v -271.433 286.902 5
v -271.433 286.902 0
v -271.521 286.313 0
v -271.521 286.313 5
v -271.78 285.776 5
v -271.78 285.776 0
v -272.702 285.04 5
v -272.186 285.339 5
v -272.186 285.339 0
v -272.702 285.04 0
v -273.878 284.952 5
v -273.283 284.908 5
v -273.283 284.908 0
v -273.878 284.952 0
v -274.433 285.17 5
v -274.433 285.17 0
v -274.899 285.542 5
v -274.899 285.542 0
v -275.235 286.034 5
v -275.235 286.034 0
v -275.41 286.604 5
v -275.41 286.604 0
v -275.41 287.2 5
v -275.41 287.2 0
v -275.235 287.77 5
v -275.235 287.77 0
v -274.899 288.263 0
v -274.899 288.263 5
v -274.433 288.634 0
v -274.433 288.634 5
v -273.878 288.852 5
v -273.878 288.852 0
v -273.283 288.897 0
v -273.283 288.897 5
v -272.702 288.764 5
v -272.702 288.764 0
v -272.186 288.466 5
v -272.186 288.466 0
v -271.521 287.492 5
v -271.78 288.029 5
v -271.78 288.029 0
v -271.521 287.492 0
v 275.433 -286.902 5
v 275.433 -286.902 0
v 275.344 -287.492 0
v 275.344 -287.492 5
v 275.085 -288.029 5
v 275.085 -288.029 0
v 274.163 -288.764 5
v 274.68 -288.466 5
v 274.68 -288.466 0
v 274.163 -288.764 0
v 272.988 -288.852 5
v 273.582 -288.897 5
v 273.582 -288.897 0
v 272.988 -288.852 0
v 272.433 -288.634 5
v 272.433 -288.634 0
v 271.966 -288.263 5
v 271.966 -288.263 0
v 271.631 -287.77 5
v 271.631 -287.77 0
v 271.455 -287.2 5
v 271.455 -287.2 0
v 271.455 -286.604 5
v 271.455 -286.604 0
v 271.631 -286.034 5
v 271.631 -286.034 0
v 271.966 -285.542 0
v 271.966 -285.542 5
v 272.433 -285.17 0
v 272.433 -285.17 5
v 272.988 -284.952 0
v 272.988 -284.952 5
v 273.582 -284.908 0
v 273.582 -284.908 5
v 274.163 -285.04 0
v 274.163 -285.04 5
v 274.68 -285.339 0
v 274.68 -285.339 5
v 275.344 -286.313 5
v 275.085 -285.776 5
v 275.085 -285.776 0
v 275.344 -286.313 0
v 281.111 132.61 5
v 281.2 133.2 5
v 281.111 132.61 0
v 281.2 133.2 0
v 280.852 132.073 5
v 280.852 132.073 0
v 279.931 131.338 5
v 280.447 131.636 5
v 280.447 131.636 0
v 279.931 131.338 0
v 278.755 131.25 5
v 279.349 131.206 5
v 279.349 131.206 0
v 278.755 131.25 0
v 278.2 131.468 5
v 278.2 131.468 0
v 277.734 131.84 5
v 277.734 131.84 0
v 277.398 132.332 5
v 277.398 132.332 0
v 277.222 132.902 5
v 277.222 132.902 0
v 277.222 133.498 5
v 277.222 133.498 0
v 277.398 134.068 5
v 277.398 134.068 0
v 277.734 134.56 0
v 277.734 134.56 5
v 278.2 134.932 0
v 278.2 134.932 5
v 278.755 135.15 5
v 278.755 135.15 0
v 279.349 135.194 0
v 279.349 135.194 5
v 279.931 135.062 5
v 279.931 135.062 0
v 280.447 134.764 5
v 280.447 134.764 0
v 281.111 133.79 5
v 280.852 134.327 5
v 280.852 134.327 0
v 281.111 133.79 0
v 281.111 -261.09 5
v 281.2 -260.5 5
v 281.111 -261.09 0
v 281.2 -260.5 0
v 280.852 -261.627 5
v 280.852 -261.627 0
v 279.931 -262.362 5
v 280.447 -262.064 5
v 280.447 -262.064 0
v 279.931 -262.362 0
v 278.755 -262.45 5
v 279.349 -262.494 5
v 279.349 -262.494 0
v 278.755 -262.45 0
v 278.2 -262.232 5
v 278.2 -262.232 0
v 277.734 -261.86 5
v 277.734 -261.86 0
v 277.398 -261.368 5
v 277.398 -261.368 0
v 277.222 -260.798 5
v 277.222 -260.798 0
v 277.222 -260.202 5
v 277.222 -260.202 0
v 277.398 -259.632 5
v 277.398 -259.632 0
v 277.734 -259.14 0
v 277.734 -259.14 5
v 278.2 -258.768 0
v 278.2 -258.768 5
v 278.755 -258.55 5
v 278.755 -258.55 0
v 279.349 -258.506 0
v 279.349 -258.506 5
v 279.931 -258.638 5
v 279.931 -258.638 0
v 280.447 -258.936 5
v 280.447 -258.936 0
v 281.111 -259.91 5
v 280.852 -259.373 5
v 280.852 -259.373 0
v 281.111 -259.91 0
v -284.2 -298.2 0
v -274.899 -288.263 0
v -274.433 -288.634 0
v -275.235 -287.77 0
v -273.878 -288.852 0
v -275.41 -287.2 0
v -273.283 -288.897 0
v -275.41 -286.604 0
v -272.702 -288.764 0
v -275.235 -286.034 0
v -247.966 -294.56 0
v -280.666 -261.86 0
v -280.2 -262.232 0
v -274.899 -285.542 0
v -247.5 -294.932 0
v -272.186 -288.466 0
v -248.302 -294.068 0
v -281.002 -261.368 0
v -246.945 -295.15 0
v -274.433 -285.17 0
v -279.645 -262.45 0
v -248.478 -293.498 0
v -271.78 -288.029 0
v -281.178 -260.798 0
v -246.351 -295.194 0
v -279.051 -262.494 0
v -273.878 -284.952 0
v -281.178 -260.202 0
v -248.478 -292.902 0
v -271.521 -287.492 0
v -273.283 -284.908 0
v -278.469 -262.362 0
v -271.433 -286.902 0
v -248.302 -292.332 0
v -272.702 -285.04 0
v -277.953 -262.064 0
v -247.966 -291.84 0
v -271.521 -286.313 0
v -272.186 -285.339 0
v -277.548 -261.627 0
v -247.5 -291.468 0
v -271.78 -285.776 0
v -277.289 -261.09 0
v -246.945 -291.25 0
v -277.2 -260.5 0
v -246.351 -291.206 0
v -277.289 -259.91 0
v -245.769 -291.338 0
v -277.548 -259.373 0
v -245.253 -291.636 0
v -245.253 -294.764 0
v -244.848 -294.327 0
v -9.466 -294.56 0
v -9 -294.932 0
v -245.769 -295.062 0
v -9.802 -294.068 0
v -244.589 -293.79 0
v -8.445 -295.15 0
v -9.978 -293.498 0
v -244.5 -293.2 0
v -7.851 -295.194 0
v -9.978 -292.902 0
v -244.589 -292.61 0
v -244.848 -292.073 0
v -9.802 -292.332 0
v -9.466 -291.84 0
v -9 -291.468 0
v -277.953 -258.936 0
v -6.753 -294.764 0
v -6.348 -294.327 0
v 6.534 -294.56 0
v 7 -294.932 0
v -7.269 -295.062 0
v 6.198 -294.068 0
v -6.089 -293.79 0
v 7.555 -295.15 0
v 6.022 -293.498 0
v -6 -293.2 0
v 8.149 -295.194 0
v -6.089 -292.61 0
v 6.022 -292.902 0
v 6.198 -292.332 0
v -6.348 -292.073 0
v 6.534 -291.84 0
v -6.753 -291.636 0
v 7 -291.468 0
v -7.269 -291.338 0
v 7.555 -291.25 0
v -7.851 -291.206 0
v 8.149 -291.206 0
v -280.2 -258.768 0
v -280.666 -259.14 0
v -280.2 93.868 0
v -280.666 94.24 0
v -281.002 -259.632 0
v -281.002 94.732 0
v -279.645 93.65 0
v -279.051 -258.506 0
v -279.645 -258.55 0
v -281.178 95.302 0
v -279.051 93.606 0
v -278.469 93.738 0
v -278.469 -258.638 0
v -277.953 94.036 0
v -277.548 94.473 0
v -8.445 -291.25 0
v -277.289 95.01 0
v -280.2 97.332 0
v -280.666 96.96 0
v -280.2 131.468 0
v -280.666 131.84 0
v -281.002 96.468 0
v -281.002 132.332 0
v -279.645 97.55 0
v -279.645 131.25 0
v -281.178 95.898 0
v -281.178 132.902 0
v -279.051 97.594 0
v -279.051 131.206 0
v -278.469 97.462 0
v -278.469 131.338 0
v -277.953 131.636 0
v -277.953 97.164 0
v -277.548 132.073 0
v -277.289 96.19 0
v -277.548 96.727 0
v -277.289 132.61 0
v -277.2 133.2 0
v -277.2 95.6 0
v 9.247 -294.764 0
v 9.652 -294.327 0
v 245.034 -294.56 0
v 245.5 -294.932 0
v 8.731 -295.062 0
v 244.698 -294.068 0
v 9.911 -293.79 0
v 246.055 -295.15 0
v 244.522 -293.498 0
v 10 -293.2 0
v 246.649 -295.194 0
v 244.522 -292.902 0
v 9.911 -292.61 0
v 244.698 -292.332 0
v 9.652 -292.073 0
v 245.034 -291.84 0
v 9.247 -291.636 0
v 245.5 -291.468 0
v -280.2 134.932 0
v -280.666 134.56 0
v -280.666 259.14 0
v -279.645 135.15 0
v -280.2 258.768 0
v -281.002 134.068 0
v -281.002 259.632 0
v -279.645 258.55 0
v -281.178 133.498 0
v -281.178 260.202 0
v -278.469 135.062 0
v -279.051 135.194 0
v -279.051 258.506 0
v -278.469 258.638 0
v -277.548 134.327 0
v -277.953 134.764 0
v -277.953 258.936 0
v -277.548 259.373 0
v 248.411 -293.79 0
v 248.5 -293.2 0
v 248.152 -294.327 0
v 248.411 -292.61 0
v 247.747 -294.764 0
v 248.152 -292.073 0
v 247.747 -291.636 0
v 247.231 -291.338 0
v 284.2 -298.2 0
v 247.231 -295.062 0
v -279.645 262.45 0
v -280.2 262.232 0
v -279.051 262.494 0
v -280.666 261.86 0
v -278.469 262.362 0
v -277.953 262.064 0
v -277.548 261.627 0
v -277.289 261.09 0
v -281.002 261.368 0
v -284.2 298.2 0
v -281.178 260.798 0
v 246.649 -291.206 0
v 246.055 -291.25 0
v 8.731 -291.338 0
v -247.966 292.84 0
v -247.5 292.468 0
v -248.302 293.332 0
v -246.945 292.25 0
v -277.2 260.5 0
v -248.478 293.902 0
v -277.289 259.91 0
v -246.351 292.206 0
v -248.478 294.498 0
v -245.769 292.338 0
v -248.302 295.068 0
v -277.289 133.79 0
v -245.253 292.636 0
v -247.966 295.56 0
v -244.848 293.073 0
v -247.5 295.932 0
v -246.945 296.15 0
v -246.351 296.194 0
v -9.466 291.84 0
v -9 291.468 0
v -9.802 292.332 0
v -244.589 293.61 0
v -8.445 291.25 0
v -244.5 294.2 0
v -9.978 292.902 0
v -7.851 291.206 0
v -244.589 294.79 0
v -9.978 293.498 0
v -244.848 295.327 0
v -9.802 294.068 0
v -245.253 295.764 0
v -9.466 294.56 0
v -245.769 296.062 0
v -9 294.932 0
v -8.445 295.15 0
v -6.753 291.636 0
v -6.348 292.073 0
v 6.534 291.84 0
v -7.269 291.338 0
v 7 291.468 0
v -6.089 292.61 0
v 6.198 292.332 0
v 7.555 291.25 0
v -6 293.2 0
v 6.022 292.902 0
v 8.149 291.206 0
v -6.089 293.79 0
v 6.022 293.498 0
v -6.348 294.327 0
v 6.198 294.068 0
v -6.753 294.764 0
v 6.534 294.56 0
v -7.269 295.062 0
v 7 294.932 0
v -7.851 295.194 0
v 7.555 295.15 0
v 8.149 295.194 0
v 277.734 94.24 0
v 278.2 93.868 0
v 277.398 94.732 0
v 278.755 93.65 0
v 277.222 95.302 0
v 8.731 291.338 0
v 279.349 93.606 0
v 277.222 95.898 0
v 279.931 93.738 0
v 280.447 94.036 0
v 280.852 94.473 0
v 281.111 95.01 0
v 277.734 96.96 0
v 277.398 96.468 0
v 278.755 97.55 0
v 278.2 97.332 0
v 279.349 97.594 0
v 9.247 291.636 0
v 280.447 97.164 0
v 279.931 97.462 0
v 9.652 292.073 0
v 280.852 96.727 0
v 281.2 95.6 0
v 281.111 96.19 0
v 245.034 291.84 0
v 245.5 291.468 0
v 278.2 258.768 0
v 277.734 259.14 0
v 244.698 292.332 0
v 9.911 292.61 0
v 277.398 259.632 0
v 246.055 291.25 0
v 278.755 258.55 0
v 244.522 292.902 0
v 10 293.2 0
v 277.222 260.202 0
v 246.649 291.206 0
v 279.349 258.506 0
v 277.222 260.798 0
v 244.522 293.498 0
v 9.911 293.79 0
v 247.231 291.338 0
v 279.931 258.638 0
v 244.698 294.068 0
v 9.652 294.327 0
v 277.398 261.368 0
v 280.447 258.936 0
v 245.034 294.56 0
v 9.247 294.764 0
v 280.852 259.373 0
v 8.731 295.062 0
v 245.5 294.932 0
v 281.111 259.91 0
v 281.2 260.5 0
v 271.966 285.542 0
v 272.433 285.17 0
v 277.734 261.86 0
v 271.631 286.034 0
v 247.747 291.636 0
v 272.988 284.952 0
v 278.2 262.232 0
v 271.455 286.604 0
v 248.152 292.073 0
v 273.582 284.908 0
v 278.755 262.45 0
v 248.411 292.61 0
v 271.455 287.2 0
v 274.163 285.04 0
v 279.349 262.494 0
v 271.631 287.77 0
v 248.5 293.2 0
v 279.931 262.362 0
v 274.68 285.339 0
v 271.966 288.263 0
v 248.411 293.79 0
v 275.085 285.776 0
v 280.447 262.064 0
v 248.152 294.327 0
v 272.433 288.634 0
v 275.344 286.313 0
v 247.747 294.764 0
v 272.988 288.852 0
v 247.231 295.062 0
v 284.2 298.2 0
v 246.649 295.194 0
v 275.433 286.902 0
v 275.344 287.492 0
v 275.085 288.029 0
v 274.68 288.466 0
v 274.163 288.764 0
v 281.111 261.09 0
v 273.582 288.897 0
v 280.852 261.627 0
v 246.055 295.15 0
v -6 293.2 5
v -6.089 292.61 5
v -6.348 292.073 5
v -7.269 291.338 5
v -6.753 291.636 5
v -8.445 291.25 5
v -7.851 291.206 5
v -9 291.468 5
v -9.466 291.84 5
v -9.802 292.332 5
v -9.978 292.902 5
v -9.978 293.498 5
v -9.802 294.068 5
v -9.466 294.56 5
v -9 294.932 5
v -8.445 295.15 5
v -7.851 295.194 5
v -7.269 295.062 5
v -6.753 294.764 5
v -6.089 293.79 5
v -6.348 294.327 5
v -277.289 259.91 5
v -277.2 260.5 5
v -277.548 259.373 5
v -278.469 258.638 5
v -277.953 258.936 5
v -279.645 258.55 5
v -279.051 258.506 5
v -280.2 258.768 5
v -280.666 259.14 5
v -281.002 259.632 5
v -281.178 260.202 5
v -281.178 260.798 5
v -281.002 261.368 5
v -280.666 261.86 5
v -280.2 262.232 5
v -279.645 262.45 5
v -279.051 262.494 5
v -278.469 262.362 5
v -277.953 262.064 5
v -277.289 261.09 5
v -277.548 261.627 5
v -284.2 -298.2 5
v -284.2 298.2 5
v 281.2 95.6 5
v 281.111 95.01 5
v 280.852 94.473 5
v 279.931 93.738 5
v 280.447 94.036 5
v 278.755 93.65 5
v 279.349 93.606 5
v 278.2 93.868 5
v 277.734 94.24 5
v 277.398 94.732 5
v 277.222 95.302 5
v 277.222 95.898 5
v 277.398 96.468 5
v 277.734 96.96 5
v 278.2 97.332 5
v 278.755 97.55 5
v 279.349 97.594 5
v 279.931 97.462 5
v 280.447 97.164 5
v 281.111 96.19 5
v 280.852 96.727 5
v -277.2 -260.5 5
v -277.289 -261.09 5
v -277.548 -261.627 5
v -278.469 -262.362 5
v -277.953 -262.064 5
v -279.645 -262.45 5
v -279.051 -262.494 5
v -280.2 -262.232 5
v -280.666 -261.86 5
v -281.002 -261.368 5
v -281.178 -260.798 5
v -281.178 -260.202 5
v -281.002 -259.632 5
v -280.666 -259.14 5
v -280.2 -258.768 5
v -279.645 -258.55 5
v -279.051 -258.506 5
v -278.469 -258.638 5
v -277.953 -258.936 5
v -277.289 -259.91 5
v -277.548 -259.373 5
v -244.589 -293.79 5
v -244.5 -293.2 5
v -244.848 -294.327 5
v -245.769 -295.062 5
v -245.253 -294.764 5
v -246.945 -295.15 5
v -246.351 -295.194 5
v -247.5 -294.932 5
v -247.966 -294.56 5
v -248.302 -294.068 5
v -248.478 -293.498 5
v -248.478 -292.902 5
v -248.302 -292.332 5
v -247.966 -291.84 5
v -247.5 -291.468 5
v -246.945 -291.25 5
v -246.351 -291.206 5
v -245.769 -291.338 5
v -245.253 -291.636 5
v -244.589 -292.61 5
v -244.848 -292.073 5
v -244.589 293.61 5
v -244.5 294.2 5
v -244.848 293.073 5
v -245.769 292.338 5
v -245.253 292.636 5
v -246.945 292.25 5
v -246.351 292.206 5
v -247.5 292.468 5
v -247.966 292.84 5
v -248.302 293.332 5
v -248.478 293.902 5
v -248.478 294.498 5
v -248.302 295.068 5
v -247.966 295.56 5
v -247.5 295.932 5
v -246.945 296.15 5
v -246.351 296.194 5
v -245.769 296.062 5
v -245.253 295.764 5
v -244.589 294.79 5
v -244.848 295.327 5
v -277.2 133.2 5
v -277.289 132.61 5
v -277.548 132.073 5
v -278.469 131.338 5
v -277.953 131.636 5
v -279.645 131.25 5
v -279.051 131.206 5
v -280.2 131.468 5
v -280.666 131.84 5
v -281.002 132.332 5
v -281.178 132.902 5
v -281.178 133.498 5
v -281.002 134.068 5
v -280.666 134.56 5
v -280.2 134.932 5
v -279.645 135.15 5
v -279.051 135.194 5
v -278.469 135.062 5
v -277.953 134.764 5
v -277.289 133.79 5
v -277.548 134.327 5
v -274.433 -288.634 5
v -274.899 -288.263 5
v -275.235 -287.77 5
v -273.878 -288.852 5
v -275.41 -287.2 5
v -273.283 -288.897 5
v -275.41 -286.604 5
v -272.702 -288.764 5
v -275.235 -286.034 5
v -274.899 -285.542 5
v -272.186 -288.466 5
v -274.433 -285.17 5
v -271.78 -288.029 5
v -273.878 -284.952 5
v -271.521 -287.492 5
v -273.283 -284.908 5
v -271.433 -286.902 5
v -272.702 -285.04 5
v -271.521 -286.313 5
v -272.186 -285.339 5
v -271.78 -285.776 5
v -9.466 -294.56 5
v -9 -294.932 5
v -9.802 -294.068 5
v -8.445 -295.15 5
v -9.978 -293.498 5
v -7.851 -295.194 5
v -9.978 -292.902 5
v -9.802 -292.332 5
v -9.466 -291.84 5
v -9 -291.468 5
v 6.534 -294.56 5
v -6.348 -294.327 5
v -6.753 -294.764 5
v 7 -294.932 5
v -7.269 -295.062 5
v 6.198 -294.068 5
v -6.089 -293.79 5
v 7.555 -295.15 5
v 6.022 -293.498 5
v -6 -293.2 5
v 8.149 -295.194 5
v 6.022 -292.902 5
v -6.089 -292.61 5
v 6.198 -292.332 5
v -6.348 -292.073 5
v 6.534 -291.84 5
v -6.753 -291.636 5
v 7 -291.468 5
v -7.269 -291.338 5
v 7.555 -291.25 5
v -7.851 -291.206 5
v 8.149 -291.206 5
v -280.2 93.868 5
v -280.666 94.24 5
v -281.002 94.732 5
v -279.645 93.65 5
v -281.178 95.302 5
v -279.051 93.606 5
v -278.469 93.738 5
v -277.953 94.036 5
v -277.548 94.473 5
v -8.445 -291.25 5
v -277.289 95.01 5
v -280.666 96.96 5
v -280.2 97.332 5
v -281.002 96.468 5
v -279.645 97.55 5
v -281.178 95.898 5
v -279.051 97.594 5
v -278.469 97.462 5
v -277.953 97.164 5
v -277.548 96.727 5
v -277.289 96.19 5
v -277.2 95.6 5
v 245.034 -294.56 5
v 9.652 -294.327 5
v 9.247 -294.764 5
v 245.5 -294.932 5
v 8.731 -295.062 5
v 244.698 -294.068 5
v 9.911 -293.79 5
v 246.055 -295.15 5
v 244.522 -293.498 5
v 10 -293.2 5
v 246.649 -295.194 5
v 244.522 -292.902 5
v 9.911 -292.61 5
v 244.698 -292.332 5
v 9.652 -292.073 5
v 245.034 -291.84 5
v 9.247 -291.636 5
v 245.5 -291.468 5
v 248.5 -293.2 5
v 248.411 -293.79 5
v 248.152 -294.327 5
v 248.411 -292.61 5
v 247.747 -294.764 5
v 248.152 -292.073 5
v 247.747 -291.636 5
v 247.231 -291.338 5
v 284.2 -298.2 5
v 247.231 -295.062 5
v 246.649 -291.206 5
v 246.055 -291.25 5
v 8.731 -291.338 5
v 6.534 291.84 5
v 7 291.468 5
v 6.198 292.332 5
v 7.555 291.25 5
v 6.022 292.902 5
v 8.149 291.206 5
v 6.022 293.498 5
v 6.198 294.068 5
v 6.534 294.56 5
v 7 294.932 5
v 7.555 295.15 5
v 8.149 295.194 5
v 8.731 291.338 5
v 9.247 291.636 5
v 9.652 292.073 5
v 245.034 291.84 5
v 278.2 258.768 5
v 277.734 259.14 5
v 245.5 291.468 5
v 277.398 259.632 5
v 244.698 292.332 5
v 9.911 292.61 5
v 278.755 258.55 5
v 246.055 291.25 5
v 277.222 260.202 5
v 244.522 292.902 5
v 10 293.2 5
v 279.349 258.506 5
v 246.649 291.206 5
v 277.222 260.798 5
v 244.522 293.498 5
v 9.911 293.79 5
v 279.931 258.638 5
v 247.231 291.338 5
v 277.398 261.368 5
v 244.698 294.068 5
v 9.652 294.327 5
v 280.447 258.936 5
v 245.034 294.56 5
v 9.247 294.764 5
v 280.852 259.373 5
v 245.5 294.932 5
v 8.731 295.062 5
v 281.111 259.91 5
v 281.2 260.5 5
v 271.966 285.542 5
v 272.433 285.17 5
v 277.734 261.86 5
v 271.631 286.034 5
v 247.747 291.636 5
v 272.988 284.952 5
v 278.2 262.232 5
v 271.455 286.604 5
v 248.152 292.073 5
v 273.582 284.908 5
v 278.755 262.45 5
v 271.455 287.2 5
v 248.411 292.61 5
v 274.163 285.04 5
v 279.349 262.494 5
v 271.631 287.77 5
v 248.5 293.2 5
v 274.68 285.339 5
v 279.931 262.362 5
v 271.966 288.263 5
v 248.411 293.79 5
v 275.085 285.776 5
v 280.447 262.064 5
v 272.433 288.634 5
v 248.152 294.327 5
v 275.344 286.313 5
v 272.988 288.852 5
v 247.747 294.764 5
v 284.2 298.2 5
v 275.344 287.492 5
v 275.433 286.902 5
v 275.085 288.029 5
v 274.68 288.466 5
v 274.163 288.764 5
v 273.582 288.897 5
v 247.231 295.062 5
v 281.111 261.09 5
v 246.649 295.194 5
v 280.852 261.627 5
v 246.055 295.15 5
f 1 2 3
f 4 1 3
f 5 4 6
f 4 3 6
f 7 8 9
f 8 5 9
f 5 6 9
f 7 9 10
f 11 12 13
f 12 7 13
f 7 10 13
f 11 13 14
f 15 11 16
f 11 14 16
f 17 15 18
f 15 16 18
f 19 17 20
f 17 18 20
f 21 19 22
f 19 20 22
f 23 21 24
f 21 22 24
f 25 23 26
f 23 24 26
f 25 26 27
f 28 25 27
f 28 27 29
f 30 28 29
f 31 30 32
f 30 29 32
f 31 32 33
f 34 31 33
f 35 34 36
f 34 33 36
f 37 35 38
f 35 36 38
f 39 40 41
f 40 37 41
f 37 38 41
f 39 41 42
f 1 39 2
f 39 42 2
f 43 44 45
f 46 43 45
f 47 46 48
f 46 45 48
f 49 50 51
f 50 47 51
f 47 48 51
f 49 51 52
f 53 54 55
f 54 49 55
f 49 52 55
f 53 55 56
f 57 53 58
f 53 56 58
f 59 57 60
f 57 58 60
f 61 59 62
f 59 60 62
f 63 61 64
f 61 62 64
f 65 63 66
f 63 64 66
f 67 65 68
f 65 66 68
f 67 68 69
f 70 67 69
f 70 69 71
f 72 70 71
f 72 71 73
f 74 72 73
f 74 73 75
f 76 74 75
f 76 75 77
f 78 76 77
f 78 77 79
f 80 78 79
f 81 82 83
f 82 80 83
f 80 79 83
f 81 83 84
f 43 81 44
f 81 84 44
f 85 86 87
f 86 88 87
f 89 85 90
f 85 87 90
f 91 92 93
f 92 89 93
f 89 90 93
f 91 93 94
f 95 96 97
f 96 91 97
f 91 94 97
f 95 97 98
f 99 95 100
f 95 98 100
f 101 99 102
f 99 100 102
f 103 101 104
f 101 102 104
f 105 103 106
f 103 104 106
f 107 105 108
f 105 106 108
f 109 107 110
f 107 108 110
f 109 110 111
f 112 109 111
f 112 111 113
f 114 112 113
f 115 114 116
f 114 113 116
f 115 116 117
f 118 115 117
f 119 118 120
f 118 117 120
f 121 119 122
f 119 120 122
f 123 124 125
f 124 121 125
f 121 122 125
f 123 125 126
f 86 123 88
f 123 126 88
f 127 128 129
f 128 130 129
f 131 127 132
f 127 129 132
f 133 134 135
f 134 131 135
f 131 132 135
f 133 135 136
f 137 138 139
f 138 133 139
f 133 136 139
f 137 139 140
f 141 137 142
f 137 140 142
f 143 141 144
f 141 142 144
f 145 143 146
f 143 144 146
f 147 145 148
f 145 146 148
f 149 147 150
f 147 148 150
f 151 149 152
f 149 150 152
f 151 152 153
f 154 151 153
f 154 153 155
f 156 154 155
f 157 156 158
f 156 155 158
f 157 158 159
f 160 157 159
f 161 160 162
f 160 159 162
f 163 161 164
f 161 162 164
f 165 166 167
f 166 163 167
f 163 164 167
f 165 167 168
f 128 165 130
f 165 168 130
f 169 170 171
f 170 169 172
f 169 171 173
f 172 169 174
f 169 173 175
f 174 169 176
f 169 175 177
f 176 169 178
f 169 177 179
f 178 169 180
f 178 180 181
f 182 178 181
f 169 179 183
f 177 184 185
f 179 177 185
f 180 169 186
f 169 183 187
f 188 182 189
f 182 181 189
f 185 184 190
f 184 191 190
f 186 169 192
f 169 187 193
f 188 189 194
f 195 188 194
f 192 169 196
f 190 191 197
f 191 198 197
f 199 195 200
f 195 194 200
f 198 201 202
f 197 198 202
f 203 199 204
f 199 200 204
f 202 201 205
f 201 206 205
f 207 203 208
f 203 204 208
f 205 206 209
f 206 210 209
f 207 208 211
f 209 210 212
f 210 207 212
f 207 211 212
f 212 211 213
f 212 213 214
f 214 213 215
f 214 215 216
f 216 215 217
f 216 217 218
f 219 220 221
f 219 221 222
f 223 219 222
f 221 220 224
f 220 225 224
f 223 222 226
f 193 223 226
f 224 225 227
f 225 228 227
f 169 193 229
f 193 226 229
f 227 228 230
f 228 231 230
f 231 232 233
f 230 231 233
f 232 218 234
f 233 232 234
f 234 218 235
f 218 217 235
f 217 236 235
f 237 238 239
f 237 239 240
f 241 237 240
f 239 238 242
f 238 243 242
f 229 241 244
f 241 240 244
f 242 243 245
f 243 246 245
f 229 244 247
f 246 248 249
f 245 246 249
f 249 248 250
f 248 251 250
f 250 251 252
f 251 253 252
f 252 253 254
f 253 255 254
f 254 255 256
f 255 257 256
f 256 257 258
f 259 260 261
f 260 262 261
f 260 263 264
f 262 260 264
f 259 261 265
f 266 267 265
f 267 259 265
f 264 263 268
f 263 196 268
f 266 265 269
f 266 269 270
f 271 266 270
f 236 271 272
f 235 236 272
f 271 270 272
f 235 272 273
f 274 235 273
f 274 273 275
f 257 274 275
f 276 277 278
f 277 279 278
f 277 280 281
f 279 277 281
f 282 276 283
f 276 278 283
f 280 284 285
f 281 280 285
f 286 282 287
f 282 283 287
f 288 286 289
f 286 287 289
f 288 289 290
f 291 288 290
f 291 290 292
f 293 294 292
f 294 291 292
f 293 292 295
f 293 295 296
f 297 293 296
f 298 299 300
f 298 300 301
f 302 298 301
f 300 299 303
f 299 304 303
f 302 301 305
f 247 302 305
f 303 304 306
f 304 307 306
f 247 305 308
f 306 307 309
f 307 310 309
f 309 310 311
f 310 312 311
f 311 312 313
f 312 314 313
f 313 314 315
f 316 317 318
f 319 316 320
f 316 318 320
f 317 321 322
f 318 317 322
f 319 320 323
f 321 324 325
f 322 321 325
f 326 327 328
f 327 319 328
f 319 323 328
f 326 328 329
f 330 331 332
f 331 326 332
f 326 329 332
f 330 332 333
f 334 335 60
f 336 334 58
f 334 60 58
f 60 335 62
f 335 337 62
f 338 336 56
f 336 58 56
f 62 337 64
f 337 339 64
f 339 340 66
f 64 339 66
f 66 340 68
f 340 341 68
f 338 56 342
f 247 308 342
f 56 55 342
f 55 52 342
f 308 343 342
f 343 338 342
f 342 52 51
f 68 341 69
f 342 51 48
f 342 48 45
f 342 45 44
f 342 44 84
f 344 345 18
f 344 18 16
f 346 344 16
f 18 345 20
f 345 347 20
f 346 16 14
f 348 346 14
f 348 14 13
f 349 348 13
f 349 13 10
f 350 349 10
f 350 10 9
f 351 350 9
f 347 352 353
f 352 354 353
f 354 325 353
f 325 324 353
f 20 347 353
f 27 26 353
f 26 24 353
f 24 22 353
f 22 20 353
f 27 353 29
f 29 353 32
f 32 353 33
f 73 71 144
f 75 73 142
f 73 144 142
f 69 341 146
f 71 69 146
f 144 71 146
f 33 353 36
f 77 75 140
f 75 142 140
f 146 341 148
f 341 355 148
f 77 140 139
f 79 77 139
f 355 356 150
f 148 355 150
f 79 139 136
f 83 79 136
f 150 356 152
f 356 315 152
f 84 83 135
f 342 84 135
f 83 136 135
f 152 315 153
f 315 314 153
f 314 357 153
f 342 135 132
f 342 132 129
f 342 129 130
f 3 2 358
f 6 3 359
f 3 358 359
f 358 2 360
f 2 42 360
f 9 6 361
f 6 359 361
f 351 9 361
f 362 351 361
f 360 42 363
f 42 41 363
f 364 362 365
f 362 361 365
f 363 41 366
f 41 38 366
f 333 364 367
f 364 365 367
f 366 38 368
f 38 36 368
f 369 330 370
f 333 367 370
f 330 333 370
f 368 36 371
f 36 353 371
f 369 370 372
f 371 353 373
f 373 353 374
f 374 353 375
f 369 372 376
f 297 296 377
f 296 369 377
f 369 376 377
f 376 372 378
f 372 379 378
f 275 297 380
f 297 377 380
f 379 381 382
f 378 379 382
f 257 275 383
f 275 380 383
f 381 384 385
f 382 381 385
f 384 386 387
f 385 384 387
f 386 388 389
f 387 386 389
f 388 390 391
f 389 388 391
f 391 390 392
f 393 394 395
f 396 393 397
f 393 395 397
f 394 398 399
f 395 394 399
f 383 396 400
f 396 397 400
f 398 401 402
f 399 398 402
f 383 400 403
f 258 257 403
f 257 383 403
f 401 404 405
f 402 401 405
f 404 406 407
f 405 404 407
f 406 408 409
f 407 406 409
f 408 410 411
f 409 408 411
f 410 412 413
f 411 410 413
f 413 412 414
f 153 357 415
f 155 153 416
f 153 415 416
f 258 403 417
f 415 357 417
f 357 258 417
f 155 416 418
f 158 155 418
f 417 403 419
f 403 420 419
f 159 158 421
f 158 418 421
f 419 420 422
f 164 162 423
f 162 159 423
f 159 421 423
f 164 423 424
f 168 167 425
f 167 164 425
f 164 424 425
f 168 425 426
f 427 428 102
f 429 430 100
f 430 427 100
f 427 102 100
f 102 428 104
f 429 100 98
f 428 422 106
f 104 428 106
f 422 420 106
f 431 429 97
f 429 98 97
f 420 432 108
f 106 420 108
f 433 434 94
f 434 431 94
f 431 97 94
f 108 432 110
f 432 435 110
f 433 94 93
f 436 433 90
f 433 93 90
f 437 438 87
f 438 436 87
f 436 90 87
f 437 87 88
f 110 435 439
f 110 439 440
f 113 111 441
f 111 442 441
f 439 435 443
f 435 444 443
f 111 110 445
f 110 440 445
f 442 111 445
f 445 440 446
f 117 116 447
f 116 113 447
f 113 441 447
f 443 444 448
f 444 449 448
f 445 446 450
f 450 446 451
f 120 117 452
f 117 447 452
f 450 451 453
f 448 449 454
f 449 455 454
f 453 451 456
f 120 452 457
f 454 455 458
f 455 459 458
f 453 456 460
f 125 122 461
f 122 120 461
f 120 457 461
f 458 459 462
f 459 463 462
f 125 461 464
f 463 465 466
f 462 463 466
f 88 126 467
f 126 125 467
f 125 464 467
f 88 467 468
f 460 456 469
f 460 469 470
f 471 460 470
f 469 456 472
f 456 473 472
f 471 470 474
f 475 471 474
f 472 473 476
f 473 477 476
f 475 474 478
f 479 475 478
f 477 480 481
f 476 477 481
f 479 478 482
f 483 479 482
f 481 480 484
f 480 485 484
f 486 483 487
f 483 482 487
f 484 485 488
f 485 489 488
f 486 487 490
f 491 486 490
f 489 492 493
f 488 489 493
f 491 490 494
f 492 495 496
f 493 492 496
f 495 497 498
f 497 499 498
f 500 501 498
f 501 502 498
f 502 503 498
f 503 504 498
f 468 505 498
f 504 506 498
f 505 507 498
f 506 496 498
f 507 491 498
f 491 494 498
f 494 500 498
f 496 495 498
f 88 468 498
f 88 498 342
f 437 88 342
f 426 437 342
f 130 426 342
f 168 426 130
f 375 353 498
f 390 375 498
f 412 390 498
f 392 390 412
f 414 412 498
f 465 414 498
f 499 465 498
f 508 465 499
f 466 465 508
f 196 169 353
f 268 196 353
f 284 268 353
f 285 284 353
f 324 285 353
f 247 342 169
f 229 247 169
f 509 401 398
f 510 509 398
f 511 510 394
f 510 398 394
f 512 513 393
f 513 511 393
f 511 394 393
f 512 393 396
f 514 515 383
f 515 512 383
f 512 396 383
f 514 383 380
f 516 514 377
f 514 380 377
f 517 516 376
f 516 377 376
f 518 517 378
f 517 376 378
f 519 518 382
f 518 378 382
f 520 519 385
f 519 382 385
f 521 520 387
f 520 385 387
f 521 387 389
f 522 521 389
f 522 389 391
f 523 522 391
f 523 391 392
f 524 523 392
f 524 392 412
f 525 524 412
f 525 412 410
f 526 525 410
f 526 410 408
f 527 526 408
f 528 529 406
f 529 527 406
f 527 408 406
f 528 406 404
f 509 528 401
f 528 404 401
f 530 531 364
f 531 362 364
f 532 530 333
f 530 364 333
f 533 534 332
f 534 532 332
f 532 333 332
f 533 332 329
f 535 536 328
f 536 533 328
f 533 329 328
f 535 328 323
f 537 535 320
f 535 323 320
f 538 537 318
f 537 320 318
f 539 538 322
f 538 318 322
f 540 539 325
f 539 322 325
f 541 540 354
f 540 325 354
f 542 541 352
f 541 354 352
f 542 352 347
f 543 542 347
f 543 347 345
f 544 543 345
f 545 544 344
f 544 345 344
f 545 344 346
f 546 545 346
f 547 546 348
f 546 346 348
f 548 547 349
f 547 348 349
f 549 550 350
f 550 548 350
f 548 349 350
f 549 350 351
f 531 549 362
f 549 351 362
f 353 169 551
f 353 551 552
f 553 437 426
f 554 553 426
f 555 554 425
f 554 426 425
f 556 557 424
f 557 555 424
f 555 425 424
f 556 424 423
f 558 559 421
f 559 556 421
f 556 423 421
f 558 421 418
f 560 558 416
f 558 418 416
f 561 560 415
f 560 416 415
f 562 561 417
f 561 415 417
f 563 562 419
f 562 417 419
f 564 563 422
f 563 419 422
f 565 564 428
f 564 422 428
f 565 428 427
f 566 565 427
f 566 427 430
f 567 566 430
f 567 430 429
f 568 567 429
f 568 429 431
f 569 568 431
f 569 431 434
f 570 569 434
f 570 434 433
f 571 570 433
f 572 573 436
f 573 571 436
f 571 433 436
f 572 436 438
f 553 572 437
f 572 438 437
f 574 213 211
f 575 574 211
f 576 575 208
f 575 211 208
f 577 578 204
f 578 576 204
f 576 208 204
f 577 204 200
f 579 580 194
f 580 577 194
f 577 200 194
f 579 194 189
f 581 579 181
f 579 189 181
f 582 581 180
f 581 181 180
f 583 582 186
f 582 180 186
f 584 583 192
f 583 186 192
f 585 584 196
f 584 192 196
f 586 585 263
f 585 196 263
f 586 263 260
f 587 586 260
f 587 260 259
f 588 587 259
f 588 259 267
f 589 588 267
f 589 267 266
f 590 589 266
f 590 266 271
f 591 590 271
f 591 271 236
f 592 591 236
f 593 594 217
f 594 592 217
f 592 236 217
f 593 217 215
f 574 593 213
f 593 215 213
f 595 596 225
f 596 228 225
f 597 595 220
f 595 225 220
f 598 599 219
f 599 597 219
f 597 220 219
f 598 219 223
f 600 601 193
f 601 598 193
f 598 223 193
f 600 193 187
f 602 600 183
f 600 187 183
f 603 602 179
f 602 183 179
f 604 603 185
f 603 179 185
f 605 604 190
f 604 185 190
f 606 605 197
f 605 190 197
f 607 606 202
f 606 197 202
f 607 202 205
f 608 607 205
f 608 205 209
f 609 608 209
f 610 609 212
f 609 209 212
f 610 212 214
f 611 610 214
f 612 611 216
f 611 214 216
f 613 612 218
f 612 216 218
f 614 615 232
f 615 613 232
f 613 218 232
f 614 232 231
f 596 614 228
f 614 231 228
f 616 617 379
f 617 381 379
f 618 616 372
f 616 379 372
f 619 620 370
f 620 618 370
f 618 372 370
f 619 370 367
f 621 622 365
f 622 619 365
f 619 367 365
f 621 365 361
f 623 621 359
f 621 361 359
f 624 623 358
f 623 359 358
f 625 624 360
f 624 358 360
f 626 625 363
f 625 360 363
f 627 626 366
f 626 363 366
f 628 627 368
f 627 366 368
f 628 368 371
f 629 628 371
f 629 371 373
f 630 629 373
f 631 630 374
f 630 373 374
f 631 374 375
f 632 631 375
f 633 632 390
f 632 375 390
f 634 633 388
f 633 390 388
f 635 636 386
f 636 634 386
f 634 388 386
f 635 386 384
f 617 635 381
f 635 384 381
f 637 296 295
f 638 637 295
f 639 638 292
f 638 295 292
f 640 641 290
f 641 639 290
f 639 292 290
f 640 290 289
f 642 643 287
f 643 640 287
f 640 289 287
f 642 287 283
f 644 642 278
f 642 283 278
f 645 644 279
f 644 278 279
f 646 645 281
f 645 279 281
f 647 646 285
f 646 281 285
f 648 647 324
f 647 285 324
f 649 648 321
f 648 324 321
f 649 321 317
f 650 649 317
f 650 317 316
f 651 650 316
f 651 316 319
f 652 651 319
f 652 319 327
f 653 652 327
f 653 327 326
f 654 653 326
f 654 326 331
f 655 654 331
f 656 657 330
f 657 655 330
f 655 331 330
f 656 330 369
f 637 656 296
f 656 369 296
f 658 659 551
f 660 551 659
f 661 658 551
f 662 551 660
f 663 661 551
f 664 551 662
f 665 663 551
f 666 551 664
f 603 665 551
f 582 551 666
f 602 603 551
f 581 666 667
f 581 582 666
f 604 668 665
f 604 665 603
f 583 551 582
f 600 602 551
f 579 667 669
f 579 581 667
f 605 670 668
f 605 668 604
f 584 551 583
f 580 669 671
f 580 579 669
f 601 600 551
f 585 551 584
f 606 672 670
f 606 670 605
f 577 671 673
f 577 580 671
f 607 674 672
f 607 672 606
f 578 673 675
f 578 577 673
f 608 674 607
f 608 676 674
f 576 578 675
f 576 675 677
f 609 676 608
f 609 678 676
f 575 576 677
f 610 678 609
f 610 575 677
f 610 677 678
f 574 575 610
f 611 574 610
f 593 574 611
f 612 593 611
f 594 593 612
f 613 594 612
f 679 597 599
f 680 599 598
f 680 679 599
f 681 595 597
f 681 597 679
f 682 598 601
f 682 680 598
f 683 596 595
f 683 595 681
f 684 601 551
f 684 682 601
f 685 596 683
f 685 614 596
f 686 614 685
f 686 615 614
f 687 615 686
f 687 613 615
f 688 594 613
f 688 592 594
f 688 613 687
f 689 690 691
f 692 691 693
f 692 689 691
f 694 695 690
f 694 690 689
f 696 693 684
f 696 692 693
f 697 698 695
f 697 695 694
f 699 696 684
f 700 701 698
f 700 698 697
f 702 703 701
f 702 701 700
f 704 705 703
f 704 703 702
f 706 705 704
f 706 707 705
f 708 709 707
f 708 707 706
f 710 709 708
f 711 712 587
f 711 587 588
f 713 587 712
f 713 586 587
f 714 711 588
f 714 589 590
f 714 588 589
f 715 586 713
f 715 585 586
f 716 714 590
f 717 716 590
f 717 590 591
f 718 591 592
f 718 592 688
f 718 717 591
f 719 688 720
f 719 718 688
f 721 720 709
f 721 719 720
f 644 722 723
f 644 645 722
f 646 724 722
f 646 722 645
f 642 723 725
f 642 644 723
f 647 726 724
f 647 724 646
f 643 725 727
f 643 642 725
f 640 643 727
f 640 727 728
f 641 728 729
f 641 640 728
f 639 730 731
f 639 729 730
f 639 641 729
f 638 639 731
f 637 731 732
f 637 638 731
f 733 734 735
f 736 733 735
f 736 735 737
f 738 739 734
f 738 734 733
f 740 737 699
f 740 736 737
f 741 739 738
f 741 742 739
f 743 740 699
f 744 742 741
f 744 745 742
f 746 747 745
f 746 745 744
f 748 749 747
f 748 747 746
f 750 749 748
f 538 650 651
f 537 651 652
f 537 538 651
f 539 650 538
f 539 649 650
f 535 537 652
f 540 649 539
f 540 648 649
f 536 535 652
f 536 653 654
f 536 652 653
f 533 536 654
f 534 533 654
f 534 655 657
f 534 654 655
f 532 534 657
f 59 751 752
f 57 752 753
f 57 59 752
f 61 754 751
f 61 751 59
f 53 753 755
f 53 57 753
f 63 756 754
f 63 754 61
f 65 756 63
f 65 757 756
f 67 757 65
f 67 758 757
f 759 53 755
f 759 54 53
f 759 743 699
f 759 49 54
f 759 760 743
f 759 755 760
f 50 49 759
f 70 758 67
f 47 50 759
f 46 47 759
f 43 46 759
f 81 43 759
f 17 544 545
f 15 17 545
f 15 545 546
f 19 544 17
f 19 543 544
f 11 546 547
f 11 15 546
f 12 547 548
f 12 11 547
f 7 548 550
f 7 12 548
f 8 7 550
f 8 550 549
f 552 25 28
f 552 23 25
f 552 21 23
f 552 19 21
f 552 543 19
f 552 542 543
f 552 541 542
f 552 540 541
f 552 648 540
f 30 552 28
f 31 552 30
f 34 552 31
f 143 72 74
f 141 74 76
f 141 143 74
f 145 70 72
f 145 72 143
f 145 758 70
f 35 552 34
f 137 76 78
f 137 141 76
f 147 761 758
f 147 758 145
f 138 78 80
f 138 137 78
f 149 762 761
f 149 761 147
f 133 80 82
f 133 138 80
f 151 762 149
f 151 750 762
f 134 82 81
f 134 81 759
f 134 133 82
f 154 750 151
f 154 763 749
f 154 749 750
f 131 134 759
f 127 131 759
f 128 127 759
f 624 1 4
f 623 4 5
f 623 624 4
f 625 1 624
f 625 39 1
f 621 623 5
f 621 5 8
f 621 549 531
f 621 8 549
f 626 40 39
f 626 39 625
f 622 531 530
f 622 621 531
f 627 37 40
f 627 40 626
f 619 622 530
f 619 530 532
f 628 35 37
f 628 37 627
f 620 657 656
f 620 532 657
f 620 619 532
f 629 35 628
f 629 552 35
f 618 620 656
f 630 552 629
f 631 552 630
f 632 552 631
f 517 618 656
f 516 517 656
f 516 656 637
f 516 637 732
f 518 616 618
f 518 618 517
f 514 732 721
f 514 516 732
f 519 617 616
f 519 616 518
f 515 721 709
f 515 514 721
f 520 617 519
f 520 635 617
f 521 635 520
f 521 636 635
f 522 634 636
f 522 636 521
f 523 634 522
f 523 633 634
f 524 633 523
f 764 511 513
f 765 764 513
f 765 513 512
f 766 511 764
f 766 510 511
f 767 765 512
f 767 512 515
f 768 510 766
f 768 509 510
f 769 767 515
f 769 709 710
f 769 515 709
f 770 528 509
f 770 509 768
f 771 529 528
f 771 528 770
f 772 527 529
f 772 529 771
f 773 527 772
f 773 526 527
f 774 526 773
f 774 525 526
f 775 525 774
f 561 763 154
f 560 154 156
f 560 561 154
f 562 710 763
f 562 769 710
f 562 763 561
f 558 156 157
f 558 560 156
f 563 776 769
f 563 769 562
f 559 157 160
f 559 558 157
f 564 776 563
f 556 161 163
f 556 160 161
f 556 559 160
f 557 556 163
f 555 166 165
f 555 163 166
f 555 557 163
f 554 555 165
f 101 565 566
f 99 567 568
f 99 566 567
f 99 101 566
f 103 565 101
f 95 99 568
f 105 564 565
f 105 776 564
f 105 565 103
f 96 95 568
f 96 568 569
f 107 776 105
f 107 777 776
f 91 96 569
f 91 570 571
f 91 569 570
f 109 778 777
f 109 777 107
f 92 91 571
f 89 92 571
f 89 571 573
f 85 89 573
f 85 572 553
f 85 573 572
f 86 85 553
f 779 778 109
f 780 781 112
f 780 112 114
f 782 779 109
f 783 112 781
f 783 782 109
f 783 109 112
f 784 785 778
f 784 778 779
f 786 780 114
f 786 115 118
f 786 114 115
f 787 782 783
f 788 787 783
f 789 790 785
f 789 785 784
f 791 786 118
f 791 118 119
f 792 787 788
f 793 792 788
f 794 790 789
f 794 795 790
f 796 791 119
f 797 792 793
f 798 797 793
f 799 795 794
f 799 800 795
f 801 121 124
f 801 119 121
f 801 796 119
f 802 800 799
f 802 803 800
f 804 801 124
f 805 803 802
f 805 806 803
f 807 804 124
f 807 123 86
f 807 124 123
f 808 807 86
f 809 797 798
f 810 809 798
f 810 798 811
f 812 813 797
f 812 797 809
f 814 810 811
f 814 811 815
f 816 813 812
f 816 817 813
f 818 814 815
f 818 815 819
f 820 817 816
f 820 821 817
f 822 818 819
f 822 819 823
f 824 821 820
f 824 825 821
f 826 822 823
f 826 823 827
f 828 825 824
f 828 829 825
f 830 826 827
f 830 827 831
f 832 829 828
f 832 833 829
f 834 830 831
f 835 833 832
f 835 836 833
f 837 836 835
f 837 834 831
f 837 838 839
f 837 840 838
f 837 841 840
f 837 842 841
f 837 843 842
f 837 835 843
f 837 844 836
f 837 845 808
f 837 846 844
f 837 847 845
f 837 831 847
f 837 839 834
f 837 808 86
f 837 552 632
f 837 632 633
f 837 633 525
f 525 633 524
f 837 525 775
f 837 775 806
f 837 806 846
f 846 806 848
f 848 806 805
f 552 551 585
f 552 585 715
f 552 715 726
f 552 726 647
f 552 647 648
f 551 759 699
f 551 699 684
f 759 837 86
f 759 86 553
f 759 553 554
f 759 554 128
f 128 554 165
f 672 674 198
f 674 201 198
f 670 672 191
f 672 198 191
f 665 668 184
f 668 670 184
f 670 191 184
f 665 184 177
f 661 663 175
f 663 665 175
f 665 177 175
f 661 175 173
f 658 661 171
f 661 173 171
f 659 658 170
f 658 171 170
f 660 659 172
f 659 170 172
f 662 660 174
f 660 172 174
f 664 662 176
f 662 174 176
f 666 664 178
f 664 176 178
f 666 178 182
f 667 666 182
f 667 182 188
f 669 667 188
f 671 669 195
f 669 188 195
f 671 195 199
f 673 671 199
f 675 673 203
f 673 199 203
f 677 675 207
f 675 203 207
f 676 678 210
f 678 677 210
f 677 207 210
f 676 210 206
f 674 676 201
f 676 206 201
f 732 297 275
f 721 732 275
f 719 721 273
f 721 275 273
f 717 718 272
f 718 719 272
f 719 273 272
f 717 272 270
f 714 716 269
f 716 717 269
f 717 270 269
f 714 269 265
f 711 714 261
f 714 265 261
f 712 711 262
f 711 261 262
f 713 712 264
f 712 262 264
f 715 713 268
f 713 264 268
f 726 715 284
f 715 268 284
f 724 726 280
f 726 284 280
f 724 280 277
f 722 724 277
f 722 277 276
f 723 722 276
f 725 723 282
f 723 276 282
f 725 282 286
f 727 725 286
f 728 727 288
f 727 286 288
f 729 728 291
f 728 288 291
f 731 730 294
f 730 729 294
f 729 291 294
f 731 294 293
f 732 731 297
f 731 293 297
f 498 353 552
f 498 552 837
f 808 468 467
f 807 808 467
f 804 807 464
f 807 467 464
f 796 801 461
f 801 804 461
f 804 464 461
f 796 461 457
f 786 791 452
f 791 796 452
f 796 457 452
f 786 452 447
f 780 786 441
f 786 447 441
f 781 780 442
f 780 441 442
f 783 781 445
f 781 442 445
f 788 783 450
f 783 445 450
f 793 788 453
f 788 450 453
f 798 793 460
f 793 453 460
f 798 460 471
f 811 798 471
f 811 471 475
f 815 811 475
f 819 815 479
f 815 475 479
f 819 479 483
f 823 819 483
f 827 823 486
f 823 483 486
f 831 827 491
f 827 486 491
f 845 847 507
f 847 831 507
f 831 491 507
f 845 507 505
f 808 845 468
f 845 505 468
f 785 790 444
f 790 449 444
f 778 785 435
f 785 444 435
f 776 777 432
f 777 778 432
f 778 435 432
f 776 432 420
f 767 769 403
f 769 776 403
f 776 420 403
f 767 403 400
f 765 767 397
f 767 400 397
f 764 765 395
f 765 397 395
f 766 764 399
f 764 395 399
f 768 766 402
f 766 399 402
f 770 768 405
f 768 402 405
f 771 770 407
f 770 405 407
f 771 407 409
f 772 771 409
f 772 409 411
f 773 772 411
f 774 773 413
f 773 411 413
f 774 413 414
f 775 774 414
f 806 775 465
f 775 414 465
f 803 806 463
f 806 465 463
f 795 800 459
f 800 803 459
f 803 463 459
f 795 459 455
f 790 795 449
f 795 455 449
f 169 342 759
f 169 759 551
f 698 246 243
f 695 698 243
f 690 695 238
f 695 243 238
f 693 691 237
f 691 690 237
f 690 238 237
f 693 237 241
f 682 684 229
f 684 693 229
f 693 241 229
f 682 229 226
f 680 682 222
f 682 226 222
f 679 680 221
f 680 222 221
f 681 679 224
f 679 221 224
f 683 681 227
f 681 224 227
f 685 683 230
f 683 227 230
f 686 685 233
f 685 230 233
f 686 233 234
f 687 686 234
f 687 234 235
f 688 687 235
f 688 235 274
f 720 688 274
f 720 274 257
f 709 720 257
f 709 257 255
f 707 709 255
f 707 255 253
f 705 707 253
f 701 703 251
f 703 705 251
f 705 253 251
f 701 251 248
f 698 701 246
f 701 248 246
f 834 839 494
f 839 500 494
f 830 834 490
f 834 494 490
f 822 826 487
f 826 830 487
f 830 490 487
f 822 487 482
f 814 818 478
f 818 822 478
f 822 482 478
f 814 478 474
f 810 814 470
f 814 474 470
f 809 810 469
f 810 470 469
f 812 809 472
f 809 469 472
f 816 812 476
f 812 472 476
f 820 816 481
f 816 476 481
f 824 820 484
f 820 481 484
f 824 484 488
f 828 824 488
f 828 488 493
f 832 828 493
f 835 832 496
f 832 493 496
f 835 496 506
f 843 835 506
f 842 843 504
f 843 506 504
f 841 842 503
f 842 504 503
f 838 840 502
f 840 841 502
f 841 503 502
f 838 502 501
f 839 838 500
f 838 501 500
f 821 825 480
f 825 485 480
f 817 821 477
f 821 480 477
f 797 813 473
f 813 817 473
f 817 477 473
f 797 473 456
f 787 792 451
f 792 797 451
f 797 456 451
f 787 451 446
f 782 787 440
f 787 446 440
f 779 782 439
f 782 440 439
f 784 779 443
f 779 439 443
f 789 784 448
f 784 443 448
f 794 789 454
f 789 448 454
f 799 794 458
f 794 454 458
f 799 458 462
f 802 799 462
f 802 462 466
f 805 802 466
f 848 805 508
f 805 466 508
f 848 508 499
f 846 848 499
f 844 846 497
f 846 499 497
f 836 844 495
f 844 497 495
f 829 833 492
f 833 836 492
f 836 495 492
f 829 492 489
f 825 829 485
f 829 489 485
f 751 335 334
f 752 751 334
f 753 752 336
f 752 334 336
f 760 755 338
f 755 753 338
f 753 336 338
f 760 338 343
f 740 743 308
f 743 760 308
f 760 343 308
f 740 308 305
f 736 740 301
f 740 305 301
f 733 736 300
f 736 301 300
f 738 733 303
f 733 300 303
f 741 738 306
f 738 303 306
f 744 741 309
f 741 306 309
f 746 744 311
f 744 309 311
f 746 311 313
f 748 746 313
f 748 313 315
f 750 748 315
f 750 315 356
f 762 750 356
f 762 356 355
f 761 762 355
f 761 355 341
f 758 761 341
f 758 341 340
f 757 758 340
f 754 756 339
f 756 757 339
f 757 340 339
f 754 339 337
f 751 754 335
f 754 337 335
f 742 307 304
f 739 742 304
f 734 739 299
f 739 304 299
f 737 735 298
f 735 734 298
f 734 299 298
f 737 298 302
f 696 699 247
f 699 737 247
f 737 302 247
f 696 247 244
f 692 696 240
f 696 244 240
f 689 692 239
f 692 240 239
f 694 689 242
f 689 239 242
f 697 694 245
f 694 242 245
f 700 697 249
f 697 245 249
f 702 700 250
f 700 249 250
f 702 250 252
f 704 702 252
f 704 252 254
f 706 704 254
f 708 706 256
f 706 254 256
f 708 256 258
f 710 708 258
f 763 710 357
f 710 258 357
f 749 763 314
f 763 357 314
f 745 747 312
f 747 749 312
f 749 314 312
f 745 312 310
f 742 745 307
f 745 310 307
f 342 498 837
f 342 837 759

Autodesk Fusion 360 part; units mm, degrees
sketch "Sketch1" plane through (0, 0, 0) normal (0, 0, 1) x (1, 0, 0)
  line L0 (284.2, -298.2) -> (-284.2, -298.2)
  line L1 (-284.2, -298.2) -> (-284.2, 298.2)
  line L2 (-284.2, 298.2) -> (284.2, 298.2)
  line L3 (284.2, 298.2) -> (284.2, -298.2)
  line L4 (284.2, -298.2) -> (-284.2, 298.2) construction
  line L5 (-284.2, -298.2) -> (284.2, 298.2) construction
  circle A0 centre (-246.5, 294.2) radius 2
  circle A1 centre (-279.2, 260.5) radius 2
  circle A2 centre (-246.5, -293.2) radius 2
  circle A3 centre (-279.2, -260.5) radius 2
  circle A4 centre (246.5, 293.2) radius 2
  circle A5 centre (279.2, 260.5) radius 2
  circle A6 centre (246.5, -293.2) radius 2
  circle A7 centre (279.2, -260.5) radius 2
  line L6 (0, -298.2) -> (0, 298.2) construction
  circle A8 centre (8, 293.2) radius 2
  circle A9 centre (8, -293.2) radius 2
  circle A10 centre (-273.4326, -286.9022) radius 2
  circle A11 centre (273.4326, -286.9022) radius 2
  circle A12 centre (273.4326, 286.9022) radius 2
  circle A13 centre (-273.4326, 286.9022) radius 2
  circle A14 centre (-8, -293.2) radius 2
  circle A15 centre (-8, 293.2) radius 2
  line L7 (284.2, 114.4) -> (-284.2, 114.4) construction
  circle A16 centre (279.2, 95.6) radius 2
  circle A17 centre (279.2, 133.2) radius 2
  circle A18 centre (-279.2, 133.2) radius 2
  circle A19 centre (-279.2, 95.6) radius 2
  dimension "d1" = 568.4
  dimension "d2" = 596.4
  dimension "d4" = 4
  dimension "d5" = 4
  dimension "d6" = 4
  dimension "d7" = 37.7
  dimension "d8" = 4
  dimension "d9" = 4
  dimension "d13" = 4
  dimension "d14" = 4
  dimension "d17" = 4
  dimension "d18" = 4
  dimension "d23" = 4
  dimension "d24" = 4
  dimension "d25" = 5
  dimension "d26" = 5
  dimension "d30" = 5
  dimension "d31" = 5
  dimension "d32" = 4
  dimension "d33" = 15.607
  dimension "d34" = 5
  dimension "d35" = 5
  dimension "d36" = 37.7
  dimension "d37" = 37.7
  dimension "d38" = 37.7
  dimension "d39" = 37.7
  dimension "d40" = 4
  dimension "d41" = 15.607
  dimension "d42" = 5
  dimension "d43" = 37.7
  dimension "d44" = 5
  dimension "d45" = 37.7
  dimension "d46" = 4
  dimension "d47" = 15.607
  dimension "d48" = 4
  dimension "d49" = 15.607
  dimension "d50" = 37.7
  dimension "d51" = 5
  dimension "d52" = 4
  dimension "d53" = 8
  dimension "d54" = 8
  dimension "d55" = 5
  dimension "d56" = 8
  dimension "d57" = 4
  dimension "d58" = 8
  dimension "d59" = 5
  dimension "d60" = 412.6
  dimension "d61" = 4
  dimension "d62" = 4
  dimension "d63" = 18.8
  dimension "d64" = 18.8
  dimension "d65" = 5
  dimension "d66" = 5
  dimension "d67" = 4
  dimension "d68" = 4
  dimension "d69" = 18.8
  dimension "d70" = 18.8
  dimension "d71" = 5
  dimension "d72" = 5
extrude "Extrude1" add sketch "Sketch1" along normal blind 5 makes body 1
copy_body "Body->Comp1" bodies 1 removing the originals makes body 2 in component "Bottom"
component "Bottom" placed x (1, 0, 0) y (0, 1, 0) z (0, 0, 1) at (0, 0, 0)
equation "d1 = XRailLength + 218.4 mm"
equation "d2 = YRailLength + 246.4 mm"
equation "d60 = YRailLength + 62.6 mm"
equation "d63 = ( 37.6 / 2 ) * 1 mm"
equation "d64 = ( 37.6 / 2 ) * 1 mm"
equation "d69 = ( 37.6 / 2 ) * 1 mm"
equation "d70 = ( 37.6 / 2 ) * 1 mm"
equation "XRailLength = 350 mm"
equation "YRailLength = 350 mm"
